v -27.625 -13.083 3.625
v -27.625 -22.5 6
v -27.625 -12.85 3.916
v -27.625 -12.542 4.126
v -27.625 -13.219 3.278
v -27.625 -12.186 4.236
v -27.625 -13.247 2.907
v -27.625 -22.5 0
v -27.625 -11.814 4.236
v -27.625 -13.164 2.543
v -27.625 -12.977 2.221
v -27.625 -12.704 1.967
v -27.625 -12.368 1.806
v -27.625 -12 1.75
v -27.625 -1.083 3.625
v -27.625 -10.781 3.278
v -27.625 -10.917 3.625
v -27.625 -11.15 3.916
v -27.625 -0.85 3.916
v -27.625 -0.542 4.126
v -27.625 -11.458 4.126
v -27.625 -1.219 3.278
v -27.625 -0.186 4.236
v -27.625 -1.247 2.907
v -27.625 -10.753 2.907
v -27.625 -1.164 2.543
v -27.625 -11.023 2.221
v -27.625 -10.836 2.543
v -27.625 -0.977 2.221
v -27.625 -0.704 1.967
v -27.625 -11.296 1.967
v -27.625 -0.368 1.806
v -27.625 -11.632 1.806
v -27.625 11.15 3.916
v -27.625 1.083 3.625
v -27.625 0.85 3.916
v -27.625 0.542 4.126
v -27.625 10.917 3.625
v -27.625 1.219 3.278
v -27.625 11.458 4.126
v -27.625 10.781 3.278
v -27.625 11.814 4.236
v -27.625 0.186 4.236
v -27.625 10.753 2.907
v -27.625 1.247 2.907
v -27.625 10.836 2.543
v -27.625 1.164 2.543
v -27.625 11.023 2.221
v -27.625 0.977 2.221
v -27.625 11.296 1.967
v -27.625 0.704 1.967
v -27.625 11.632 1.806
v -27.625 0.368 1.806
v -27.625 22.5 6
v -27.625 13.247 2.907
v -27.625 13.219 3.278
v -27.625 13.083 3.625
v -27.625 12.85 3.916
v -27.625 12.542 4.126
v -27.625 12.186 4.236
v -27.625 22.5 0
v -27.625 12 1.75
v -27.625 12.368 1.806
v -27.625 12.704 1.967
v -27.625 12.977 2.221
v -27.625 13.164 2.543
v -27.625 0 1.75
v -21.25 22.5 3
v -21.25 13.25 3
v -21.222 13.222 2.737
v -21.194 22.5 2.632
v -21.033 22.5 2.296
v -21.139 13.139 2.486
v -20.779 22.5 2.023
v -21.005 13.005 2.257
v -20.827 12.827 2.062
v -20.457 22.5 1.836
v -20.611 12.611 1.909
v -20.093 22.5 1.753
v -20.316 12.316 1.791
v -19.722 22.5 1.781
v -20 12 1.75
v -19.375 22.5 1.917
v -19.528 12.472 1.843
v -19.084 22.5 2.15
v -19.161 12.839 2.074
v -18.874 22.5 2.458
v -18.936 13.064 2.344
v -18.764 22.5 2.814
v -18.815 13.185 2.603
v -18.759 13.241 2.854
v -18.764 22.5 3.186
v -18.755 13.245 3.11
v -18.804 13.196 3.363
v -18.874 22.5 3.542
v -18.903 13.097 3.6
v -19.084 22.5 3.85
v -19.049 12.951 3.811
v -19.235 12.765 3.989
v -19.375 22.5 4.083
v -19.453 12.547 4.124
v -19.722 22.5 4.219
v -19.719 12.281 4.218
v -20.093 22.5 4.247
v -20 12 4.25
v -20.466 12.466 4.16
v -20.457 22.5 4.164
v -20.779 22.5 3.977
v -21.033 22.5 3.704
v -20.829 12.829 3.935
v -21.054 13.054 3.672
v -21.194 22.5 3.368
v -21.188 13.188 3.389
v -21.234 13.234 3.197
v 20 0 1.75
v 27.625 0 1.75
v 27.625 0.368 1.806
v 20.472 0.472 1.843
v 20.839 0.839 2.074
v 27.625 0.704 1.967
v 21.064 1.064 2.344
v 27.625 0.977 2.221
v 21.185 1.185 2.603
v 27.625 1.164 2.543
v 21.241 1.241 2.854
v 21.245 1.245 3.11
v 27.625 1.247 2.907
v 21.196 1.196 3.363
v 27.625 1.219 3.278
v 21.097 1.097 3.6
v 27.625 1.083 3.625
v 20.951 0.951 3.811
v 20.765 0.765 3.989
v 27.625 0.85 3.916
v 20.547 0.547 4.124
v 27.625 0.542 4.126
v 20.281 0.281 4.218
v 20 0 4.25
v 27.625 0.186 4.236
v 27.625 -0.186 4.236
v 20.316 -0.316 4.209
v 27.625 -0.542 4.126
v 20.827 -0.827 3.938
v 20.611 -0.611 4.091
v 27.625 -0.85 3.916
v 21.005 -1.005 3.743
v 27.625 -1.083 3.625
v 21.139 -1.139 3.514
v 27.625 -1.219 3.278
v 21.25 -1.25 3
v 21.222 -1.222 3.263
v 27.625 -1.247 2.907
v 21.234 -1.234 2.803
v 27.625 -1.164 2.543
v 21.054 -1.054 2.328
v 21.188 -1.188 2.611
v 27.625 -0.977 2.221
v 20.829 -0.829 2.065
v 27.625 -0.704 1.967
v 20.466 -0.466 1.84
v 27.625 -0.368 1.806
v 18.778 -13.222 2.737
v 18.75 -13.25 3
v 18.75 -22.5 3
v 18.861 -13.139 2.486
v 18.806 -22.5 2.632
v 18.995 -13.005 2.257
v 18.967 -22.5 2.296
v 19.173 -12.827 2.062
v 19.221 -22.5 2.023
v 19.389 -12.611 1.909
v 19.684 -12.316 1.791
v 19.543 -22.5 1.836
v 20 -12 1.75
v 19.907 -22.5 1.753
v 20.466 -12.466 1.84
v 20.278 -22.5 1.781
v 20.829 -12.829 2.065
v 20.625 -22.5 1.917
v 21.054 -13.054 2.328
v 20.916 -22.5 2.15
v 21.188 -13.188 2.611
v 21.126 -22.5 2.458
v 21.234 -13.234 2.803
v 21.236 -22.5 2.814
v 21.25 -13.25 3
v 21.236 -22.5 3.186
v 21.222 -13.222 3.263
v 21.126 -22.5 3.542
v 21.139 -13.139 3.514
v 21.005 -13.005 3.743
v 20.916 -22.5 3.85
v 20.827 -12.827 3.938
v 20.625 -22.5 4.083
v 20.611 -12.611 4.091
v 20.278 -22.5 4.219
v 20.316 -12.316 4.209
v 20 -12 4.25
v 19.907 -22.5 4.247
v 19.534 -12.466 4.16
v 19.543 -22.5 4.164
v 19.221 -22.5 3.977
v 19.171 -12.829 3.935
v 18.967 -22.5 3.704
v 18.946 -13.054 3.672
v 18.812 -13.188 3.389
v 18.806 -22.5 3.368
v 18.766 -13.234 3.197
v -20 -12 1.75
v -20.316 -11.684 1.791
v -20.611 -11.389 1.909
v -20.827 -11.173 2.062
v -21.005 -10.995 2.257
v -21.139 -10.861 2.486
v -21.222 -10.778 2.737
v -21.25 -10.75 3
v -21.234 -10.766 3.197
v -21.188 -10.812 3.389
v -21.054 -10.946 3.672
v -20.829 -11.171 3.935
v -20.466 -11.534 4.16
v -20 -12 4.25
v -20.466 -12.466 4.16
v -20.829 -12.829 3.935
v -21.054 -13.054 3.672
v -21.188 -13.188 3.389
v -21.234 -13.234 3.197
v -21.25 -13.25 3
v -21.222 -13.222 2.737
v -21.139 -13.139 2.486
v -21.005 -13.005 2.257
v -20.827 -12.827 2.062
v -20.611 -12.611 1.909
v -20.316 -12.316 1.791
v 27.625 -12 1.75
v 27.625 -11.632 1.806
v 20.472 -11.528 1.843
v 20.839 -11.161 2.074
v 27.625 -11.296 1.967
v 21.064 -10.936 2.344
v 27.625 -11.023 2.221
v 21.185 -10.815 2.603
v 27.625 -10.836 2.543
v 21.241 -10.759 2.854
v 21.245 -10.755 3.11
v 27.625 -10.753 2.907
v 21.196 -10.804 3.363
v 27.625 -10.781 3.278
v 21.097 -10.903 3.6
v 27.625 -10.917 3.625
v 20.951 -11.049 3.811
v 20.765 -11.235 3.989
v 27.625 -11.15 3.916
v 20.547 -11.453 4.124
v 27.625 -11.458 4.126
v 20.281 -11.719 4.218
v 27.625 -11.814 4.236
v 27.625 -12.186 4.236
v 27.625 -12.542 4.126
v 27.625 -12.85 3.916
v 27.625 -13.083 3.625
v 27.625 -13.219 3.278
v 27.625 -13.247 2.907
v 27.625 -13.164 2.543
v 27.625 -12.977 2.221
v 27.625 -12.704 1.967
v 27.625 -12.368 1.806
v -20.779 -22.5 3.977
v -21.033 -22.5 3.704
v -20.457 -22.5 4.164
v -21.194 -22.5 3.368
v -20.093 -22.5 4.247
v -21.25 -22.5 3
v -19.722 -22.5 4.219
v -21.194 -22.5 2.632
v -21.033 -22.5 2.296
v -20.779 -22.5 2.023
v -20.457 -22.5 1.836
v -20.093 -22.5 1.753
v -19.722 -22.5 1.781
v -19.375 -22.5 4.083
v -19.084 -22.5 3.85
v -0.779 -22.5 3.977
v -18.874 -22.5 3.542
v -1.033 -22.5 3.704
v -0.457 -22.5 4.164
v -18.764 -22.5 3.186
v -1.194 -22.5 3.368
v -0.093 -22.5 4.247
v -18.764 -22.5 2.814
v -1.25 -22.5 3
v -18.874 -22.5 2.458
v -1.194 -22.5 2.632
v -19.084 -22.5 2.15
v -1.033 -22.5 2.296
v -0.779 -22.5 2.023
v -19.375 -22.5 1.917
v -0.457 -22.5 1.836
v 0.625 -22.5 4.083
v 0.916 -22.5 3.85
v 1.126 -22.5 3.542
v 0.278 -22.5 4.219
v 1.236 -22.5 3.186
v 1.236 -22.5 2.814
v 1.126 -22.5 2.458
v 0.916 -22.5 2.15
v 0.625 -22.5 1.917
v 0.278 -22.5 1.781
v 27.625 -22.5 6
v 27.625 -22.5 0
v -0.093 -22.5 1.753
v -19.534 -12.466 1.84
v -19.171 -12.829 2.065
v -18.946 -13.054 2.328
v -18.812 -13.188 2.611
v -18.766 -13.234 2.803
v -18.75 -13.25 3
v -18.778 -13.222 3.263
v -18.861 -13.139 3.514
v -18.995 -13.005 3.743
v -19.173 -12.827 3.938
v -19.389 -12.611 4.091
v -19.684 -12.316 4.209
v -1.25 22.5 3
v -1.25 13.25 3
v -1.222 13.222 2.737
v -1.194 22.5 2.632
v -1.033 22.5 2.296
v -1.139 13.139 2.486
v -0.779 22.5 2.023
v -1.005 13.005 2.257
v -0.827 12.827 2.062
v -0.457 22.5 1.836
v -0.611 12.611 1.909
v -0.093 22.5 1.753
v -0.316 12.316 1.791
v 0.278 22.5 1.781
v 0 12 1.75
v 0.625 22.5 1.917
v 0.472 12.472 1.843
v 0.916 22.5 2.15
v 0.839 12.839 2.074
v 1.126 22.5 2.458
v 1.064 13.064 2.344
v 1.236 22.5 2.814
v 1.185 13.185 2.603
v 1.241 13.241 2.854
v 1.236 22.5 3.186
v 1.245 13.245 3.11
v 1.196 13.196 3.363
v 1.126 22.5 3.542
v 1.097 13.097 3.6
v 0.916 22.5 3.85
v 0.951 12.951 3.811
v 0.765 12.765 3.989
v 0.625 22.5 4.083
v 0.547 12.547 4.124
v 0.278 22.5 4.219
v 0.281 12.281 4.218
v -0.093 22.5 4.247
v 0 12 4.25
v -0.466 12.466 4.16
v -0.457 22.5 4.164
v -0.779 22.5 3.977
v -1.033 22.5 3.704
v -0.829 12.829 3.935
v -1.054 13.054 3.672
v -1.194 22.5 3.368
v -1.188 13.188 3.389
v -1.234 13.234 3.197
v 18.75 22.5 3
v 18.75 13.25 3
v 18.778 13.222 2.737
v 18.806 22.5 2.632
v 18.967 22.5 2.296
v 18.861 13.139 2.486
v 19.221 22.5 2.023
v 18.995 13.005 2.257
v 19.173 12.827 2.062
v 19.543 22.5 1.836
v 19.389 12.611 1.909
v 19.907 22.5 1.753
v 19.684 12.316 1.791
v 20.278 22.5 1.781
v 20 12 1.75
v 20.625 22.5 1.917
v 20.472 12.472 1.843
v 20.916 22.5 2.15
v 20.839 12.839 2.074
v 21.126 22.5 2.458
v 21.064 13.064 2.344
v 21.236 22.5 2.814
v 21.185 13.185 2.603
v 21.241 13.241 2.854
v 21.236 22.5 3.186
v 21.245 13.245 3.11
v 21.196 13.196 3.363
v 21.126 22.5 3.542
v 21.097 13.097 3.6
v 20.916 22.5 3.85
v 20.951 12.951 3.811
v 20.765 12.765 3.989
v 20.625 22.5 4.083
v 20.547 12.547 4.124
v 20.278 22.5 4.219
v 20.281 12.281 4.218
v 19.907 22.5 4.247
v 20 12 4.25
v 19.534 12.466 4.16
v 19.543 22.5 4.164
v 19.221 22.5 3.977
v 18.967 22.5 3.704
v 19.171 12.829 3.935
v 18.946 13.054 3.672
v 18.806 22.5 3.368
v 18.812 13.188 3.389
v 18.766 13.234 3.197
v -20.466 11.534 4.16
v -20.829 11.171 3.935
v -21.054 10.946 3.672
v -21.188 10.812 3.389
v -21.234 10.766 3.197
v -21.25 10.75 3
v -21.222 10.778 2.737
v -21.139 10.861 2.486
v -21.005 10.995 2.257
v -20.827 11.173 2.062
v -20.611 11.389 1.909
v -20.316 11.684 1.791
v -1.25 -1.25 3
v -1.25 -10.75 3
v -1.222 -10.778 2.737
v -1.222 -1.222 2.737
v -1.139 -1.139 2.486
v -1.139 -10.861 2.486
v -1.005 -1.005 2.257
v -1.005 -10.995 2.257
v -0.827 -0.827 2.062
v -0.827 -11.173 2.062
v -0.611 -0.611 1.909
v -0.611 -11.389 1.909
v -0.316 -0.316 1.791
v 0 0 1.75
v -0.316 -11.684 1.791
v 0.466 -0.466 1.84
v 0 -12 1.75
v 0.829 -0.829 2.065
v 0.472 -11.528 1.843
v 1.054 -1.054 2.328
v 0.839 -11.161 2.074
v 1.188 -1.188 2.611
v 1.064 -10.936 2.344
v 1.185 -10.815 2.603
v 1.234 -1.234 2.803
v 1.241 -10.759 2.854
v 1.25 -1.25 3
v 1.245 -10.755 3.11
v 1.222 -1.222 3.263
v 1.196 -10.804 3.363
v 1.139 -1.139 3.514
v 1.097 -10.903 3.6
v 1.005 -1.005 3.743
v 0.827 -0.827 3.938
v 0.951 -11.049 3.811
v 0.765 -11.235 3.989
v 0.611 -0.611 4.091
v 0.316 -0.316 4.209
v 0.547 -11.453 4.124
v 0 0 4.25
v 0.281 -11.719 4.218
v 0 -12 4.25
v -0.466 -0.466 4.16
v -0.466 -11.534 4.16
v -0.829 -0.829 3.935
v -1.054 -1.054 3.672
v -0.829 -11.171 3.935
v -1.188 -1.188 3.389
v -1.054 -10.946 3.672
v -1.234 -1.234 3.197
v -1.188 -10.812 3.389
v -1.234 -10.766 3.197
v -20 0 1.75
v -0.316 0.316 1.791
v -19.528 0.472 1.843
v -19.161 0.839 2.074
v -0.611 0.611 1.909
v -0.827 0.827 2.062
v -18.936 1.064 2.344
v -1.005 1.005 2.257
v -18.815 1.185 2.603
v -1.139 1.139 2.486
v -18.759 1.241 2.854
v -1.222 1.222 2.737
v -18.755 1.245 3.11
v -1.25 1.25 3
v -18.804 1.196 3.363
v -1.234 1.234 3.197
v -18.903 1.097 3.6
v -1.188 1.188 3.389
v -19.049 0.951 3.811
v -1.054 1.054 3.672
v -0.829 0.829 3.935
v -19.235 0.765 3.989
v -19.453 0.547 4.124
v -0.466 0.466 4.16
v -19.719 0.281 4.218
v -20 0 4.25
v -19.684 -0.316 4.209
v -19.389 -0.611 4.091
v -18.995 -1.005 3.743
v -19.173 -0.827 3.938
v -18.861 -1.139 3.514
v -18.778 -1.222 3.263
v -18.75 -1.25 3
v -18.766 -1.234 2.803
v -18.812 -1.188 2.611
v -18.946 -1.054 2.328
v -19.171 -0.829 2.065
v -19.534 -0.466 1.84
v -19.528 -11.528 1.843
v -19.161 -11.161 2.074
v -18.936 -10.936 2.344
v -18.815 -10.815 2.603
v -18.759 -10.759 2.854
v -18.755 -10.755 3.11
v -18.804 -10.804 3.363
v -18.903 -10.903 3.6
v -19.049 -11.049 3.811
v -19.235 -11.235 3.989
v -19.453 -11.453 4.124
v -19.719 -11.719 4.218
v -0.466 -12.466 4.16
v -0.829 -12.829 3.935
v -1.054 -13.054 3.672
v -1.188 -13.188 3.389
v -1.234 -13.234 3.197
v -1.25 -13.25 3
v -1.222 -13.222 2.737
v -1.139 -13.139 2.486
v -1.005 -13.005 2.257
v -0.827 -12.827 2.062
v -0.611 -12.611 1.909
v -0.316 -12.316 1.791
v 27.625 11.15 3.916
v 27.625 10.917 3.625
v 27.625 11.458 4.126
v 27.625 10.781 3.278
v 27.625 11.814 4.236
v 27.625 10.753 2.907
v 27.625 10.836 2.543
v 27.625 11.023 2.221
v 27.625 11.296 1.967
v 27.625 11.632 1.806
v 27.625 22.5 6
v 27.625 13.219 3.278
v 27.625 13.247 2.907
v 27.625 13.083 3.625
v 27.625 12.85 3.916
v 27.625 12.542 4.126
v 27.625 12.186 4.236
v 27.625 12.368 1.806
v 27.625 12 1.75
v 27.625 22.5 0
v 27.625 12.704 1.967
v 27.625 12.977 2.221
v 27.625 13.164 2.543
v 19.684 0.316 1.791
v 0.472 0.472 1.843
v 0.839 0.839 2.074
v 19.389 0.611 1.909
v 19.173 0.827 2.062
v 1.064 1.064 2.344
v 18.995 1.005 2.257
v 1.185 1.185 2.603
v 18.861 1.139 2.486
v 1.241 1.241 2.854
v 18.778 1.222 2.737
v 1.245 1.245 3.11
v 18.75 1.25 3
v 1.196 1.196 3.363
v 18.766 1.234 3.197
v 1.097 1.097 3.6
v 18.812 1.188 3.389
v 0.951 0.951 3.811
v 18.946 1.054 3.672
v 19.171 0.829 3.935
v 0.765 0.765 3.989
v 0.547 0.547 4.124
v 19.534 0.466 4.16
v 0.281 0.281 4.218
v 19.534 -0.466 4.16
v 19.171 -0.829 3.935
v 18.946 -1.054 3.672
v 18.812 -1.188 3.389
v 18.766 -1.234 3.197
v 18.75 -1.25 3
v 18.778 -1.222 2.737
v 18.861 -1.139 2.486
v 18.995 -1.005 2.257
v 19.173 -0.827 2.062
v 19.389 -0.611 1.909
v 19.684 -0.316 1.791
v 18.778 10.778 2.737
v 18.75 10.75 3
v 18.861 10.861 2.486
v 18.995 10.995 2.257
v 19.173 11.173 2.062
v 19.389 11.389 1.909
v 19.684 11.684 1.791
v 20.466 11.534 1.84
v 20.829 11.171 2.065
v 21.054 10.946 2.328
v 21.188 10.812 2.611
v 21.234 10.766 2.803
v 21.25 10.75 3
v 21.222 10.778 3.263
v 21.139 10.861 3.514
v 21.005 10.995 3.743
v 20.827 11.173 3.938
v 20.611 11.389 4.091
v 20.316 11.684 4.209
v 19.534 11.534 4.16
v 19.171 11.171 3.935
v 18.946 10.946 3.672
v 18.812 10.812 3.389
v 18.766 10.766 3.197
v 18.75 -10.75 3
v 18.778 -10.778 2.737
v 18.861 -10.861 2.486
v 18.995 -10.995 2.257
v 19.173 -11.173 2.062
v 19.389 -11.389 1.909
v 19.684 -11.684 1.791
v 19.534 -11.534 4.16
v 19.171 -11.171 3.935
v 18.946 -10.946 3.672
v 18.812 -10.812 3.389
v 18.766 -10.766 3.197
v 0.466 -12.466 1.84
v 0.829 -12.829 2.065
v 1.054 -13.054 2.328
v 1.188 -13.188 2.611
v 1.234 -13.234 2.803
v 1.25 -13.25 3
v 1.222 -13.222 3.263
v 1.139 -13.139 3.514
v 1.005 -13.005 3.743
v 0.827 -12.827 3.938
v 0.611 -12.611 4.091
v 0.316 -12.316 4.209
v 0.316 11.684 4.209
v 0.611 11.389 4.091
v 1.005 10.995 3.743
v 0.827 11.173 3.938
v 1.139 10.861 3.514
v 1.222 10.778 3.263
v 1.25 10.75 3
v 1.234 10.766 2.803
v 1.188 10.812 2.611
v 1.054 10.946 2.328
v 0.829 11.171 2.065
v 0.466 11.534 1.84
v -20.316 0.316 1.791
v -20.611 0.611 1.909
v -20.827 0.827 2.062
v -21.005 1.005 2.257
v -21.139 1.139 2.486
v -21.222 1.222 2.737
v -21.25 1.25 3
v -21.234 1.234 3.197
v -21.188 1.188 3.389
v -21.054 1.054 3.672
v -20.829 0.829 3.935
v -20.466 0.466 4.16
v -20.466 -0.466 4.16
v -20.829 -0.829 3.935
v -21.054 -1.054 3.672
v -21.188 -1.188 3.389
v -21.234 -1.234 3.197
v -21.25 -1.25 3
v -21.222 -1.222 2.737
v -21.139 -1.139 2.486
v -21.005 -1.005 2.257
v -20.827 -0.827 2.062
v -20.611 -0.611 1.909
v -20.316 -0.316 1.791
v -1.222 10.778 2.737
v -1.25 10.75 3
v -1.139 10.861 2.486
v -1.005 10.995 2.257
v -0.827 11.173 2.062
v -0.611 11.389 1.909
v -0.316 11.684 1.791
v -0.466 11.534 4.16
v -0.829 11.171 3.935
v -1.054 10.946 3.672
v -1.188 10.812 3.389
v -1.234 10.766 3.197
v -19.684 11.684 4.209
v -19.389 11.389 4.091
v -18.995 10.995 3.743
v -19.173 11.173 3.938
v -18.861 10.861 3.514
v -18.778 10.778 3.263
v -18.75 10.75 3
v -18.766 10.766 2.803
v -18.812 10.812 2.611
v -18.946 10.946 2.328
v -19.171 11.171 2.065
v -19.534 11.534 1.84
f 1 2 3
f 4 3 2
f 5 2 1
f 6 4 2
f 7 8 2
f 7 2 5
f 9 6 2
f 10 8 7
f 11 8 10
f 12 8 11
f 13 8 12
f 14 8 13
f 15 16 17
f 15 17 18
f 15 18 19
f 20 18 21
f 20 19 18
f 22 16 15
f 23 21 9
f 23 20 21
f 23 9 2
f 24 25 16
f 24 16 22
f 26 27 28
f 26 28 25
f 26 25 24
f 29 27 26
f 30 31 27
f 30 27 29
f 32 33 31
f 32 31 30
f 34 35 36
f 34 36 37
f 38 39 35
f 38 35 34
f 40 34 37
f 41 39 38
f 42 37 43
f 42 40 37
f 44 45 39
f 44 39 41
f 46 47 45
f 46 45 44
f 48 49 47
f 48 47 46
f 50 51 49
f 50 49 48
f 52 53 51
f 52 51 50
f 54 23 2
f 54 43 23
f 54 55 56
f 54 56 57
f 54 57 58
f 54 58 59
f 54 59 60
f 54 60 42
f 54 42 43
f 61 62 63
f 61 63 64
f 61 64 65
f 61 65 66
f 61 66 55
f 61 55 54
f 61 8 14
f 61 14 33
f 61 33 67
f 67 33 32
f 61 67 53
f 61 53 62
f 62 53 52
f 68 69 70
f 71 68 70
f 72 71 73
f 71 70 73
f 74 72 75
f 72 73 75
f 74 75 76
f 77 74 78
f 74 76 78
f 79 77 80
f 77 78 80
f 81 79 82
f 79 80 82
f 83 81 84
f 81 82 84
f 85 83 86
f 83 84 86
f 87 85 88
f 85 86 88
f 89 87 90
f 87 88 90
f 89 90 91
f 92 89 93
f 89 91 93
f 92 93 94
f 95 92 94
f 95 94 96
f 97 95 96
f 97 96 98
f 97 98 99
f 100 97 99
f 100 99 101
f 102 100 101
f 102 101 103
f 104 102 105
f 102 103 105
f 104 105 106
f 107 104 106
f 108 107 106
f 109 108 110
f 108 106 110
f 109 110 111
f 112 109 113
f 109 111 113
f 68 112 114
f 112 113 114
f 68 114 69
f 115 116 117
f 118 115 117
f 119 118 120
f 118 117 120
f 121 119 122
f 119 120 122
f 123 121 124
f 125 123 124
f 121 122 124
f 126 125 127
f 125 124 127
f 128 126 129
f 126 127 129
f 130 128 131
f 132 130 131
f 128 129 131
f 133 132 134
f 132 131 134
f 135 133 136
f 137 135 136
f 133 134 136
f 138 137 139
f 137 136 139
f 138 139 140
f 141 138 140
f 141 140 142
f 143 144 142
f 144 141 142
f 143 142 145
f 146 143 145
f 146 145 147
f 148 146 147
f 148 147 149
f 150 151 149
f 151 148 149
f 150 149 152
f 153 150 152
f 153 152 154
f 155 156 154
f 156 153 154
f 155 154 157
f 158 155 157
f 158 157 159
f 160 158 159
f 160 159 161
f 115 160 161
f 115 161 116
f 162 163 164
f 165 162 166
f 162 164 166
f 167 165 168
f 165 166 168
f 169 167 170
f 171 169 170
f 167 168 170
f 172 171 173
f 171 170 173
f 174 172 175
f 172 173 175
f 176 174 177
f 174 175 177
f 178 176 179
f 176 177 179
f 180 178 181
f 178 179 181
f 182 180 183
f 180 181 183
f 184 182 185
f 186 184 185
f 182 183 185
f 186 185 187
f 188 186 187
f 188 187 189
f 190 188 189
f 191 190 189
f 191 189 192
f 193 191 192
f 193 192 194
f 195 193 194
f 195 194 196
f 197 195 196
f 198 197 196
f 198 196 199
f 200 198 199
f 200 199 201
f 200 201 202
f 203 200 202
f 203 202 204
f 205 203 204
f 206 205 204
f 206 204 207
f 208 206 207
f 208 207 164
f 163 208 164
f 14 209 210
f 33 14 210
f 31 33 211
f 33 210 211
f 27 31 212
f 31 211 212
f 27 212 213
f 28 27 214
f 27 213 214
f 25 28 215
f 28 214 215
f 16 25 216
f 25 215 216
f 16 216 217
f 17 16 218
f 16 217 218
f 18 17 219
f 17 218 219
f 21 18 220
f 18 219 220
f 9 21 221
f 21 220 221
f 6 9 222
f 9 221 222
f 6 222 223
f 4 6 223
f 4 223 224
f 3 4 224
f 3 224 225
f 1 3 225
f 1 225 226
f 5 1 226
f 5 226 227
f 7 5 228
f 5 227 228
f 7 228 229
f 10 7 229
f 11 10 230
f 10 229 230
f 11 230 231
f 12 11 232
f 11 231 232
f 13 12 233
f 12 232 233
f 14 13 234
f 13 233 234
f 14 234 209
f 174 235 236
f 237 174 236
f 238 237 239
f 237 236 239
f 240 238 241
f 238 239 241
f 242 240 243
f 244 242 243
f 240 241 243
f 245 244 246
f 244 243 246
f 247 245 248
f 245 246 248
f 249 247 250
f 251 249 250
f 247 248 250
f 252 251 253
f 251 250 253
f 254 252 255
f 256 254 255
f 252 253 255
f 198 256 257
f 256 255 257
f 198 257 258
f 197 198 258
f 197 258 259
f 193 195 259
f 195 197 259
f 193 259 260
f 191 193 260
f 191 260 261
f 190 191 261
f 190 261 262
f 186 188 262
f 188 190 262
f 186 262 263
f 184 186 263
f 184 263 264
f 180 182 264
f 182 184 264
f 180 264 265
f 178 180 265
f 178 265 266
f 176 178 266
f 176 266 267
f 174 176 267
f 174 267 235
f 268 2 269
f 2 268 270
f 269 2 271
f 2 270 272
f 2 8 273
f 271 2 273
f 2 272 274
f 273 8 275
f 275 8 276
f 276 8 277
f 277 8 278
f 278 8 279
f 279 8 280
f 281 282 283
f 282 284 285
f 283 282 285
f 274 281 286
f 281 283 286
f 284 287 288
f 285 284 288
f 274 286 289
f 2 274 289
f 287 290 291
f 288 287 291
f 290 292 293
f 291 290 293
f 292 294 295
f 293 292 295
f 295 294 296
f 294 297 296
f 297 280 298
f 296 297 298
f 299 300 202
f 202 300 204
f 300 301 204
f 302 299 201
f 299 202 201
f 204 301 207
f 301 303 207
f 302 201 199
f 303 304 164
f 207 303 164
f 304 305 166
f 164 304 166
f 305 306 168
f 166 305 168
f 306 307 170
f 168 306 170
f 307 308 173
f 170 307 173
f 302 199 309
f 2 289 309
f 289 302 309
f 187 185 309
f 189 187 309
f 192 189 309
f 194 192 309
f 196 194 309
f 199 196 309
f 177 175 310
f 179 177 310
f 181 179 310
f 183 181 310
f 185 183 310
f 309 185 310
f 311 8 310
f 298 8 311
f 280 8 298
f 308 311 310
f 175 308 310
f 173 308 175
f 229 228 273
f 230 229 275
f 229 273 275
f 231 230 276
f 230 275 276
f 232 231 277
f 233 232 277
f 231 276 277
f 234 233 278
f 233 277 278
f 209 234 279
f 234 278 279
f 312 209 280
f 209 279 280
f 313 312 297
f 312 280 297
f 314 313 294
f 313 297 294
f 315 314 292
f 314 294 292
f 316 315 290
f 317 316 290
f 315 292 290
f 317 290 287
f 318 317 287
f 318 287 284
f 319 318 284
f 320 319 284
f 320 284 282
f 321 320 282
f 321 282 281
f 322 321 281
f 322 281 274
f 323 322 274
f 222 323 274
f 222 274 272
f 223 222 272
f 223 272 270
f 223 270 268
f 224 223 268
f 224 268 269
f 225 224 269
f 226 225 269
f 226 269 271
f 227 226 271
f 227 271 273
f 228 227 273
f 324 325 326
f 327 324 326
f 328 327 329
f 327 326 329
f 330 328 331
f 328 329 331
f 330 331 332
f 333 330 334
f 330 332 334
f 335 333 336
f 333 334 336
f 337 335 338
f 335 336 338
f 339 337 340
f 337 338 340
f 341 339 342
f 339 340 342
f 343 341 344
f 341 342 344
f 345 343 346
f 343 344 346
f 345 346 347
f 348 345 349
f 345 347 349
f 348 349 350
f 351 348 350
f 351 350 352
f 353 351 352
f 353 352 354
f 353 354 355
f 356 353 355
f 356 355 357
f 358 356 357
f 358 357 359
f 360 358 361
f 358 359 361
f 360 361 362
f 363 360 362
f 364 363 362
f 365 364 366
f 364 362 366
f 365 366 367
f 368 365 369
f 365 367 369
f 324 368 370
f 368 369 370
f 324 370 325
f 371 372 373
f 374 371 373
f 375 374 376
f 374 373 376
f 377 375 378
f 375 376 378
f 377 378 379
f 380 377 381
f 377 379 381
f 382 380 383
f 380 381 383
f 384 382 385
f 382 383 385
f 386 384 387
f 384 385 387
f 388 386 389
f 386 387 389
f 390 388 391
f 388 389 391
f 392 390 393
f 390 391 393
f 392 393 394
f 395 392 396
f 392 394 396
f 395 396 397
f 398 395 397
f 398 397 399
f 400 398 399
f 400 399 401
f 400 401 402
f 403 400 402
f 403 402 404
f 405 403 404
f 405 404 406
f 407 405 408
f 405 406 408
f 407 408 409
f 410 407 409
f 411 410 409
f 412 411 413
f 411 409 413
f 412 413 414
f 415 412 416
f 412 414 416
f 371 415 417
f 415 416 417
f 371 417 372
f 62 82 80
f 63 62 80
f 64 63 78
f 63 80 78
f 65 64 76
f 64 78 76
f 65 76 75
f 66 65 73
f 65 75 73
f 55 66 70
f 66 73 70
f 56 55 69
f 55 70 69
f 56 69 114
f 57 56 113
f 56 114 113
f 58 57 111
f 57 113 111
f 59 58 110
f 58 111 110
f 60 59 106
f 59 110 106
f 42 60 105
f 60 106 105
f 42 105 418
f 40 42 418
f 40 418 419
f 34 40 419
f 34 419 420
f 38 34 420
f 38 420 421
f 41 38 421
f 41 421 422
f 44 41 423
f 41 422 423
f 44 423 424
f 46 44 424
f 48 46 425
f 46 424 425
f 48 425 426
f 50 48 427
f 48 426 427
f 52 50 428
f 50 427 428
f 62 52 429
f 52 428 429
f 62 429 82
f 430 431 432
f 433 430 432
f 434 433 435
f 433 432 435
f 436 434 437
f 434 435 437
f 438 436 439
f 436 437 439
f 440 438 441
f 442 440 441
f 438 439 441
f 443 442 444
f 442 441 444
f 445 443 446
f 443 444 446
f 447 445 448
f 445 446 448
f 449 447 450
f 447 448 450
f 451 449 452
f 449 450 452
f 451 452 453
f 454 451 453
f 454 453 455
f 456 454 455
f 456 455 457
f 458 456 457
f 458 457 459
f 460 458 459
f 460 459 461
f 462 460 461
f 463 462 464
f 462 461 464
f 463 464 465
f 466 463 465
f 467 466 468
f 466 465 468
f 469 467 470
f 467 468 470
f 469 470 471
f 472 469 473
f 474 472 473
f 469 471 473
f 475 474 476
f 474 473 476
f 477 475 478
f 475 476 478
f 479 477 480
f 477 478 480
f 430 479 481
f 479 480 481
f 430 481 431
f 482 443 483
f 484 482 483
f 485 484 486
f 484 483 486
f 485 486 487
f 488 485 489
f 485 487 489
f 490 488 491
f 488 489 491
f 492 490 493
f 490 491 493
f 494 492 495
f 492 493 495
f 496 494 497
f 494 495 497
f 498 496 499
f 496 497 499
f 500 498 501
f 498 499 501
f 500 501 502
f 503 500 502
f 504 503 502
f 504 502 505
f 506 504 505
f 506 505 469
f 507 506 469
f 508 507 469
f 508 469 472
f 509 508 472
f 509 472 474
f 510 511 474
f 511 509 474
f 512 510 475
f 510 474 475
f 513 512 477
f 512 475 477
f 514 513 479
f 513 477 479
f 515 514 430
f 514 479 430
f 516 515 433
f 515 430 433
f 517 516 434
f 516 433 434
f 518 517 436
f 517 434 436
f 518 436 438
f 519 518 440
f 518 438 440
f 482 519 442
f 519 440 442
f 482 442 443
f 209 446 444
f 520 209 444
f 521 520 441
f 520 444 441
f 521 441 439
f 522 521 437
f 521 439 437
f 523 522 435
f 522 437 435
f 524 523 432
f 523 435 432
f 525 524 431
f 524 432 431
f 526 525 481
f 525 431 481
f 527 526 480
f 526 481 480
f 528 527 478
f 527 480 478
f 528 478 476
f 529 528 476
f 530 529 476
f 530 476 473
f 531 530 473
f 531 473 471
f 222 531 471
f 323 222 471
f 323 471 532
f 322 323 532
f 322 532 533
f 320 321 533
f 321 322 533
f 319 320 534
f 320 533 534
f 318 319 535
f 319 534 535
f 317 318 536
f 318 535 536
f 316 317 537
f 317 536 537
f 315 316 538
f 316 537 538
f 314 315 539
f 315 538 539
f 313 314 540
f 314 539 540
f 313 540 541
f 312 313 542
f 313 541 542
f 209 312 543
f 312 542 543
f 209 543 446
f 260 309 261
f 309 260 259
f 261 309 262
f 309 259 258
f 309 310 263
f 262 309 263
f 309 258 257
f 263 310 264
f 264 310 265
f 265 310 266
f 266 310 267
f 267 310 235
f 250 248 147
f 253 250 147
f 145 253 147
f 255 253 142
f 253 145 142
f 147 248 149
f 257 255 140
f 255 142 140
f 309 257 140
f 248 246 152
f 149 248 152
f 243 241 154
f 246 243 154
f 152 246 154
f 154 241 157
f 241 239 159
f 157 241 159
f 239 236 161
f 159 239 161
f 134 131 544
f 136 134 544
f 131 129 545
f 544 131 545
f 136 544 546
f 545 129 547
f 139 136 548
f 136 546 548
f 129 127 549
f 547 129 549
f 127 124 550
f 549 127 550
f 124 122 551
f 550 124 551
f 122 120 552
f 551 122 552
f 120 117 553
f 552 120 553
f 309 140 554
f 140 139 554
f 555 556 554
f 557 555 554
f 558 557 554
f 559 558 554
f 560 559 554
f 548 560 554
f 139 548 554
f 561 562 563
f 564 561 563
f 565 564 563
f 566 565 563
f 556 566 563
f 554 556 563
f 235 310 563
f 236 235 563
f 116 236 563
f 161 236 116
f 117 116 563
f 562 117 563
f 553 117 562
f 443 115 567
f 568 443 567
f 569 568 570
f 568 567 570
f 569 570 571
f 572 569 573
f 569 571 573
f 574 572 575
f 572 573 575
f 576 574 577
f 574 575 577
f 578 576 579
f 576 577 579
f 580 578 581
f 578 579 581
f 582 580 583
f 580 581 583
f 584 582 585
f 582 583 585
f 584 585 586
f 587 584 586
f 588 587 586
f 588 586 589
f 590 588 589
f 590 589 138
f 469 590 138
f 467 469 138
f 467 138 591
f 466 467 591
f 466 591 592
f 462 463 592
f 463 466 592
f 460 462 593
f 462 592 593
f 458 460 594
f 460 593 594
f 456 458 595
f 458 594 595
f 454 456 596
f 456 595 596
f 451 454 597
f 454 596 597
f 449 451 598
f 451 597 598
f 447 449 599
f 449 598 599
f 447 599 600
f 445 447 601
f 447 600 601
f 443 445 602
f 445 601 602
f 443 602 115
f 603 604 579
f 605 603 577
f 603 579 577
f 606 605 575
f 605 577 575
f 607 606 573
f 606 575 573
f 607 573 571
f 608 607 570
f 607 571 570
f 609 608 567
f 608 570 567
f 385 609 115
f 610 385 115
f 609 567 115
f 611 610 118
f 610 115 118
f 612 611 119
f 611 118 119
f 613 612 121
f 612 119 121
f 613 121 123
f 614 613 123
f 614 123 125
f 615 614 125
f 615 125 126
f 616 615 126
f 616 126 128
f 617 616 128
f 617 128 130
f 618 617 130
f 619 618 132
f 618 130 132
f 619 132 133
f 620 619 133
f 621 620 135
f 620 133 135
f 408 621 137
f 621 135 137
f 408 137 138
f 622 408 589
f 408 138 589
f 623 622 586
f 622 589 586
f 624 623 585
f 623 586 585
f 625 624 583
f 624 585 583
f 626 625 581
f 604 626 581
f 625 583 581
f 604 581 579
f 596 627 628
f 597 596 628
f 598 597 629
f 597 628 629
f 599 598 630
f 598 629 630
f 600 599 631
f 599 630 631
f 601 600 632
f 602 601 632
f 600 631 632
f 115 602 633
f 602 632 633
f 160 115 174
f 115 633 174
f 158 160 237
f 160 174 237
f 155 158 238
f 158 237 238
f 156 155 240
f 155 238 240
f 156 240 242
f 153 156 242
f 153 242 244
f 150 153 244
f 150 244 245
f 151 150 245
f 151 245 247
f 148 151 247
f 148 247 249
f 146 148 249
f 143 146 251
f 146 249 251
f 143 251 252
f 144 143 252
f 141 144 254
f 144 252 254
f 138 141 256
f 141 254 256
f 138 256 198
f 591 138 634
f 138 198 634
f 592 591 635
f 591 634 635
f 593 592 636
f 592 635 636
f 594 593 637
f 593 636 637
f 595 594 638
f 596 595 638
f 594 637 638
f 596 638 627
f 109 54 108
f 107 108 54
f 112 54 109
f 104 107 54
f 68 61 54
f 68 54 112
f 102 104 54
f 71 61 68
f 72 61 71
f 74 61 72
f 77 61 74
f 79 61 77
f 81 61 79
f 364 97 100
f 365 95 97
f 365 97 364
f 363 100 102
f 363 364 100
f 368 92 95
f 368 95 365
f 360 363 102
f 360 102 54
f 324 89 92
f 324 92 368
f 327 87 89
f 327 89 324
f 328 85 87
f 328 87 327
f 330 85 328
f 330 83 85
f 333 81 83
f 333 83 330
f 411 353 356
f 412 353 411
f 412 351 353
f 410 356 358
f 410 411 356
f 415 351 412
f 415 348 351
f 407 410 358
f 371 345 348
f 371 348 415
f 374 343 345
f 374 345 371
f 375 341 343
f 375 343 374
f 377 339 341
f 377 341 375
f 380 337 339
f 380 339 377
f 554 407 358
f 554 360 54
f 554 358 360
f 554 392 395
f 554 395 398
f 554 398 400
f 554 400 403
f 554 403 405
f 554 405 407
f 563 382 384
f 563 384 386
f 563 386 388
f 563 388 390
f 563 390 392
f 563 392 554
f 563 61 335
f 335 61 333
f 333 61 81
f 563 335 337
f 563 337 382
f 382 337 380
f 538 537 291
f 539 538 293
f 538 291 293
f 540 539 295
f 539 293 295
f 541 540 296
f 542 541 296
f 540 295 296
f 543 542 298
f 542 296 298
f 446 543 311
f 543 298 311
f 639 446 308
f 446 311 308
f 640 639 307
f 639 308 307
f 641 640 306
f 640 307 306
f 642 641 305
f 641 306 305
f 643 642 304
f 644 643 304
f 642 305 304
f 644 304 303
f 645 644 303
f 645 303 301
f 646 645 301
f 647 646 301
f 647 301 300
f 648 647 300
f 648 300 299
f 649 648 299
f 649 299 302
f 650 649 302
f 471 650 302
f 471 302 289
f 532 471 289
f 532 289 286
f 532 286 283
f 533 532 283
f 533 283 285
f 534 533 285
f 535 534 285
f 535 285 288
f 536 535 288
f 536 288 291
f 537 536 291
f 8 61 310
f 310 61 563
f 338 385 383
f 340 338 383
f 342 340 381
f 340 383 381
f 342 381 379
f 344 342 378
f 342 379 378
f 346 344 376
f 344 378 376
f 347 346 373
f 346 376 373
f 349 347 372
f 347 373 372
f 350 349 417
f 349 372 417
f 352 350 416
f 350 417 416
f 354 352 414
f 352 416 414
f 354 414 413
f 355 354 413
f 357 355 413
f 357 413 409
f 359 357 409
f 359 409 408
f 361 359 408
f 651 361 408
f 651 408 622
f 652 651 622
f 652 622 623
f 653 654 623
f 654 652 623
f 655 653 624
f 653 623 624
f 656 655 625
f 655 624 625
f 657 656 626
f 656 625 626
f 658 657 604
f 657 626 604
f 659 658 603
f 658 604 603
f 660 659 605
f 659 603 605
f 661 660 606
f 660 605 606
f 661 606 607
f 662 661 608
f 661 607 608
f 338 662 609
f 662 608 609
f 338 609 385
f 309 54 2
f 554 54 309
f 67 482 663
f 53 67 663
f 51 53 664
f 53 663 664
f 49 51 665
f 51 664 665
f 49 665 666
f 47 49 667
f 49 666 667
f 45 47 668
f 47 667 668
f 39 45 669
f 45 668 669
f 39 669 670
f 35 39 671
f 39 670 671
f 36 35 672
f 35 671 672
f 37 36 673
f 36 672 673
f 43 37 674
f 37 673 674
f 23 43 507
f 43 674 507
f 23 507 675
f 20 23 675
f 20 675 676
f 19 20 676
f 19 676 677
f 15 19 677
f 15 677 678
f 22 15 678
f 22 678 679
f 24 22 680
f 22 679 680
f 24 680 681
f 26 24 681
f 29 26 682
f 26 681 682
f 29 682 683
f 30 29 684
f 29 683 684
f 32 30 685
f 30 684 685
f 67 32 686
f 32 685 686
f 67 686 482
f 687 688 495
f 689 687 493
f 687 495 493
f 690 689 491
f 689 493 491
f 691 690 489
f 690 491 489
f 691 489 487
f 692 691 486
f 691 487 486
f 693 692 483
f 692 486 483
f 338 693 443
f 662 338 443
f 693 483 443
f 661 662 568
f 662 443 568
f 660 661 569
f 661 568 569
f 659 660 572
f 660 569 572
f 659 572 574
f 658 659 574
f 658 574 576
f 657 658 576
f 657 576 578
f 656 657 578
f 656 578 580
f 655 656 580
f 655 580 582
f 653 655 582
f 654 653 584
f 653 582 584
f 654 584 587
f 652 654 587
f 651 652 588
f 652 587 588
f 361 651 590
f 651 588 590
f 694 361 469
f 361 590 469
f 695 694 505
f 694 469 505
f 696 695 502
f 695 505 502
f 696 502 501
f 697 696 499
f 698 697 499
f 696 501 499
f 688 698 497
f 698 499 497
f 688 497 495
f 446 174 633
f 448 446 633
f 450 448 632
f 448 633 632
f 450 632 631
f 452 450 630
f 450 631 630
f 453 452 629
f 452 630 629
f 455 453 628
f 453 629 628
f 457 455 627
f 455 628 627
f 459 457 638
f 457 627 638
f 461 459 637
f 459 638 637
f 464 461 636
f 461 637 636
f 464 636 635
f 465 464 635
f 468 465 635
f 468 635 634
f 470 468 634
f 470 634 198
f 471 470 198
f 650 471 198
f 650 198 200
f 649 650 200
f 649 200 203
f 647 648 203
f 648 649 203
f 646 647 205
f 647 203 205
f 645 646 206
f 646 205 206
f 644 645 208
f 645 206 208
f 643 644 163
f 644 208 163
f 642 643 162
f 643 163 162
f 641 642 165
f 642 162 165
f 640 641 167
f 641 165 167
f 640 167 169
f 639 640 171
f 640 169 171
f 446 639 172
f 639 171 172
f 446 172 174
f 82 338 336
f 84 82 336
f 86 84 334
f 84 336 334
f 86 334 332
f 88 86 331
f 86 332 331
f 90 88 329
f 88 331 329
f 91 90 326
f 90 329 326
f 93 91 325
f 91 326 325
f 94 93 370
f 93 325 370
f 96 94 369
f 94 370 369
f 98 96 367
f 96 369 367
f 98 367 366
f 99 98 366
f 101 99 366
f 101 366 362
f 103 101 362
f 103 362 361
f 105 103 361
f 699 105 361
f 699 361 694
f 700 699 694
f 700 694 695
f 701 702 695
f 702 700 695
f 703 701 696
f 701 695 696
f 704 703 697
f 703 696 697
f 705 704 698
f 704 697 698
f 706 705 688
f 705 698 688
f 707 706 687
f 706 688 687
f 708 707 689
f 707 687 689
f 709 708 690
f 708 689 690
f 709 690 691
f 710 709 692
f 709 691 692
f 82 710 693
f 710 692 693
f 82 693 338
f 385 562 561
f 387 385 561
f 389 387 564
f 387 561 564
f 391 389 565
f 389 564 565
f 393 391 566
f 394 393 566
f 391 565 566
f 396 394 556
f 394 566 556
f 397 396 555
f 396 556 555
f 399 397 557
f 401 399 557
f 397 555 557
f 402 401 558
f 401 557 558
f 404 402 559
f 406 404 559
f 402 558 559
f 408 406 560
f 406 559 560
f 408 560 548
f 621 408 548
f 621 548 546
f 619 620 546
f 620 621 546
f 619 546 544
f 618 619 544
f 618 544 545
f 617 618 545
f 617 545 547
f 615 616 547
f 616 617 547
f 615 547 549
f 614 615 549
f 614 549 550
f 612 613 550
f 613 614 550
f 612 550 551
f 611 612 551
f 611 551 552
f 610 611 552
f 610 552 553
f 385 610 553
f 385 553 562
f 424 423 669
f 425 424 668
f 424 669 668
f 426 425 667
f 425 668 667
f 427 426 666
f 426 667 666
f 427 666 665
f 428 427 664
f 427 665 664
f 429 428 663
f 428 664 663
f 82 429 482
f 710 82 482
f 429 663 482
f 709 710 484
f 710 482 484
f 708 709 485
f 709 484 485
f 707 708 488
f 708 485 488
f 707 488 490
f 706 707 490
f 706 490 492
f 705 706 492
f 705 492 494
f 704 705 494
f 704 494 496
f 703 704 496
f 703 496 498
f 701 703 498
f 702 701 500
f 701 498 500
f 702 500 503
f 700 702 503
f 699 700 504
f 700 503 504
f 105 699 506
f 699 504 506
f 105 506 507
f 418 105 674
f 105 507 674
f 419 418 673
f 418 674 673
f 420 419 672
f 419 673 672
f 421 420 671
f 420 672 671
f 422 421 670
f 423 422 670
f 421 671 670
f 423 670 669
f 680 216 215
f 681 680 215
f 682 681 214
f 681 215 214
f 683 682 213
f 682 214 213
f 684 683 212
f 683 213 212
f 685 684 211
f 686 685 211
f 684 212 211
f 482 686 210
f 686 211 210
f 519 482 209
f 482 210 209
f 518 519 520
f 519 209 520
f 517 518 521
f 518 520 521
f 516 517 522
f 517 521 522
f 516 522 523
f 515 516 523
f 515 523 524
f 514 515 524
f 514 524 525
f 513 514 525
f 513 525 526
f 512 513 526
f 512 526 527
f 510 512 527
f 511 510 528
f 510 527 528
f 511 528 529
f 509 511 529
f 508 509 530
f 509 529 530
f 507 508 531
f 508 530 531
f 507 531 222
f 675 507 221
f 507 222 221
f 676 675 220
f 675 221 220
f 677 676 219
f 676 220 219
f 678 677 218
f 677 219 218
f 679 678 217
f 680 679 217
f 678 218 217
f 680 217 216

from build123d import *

# Parameters (mm, degrees)
SKETCH_1_W         = 55.25
SKETCH_1_H         = 45
EXTRUDE_1_DEPTH    = 6
HOLE_WIZARD_M3_1_D = 2.5
HOLE_WIZARD_M3_2_D = 2.5


with BuildPart() as part:
    # 草图1 → 凸台-拉伸1 (new body)
    with BuildSketch(Plane.XY):
        Rectangle(SKETCH_1_W, SKETCH_1_H)
    extrude(amount=EXTRUDE_1_DEPTH)

    # M3 螺纹孔1 (through all)
    with Locations(Plane(origin=(0, 22.5, 0), x_dir=(1, 0, 0), z_dir=(0, 1, 0))):
        with Locations((-20, -3), (0, -3), (20, -3)):
            Hole(HOLE_WIZARD_M3_1_D / 2)

    # M3 螺纹孔2 (through all)
    with Locations(Plane.ZY.offset(27.625)):
        with Locations((3, 12), (3, -12), (3, 0)):
            Hole(HOLE_WIZARD_M3_2_D / 2)


solid = part.part
